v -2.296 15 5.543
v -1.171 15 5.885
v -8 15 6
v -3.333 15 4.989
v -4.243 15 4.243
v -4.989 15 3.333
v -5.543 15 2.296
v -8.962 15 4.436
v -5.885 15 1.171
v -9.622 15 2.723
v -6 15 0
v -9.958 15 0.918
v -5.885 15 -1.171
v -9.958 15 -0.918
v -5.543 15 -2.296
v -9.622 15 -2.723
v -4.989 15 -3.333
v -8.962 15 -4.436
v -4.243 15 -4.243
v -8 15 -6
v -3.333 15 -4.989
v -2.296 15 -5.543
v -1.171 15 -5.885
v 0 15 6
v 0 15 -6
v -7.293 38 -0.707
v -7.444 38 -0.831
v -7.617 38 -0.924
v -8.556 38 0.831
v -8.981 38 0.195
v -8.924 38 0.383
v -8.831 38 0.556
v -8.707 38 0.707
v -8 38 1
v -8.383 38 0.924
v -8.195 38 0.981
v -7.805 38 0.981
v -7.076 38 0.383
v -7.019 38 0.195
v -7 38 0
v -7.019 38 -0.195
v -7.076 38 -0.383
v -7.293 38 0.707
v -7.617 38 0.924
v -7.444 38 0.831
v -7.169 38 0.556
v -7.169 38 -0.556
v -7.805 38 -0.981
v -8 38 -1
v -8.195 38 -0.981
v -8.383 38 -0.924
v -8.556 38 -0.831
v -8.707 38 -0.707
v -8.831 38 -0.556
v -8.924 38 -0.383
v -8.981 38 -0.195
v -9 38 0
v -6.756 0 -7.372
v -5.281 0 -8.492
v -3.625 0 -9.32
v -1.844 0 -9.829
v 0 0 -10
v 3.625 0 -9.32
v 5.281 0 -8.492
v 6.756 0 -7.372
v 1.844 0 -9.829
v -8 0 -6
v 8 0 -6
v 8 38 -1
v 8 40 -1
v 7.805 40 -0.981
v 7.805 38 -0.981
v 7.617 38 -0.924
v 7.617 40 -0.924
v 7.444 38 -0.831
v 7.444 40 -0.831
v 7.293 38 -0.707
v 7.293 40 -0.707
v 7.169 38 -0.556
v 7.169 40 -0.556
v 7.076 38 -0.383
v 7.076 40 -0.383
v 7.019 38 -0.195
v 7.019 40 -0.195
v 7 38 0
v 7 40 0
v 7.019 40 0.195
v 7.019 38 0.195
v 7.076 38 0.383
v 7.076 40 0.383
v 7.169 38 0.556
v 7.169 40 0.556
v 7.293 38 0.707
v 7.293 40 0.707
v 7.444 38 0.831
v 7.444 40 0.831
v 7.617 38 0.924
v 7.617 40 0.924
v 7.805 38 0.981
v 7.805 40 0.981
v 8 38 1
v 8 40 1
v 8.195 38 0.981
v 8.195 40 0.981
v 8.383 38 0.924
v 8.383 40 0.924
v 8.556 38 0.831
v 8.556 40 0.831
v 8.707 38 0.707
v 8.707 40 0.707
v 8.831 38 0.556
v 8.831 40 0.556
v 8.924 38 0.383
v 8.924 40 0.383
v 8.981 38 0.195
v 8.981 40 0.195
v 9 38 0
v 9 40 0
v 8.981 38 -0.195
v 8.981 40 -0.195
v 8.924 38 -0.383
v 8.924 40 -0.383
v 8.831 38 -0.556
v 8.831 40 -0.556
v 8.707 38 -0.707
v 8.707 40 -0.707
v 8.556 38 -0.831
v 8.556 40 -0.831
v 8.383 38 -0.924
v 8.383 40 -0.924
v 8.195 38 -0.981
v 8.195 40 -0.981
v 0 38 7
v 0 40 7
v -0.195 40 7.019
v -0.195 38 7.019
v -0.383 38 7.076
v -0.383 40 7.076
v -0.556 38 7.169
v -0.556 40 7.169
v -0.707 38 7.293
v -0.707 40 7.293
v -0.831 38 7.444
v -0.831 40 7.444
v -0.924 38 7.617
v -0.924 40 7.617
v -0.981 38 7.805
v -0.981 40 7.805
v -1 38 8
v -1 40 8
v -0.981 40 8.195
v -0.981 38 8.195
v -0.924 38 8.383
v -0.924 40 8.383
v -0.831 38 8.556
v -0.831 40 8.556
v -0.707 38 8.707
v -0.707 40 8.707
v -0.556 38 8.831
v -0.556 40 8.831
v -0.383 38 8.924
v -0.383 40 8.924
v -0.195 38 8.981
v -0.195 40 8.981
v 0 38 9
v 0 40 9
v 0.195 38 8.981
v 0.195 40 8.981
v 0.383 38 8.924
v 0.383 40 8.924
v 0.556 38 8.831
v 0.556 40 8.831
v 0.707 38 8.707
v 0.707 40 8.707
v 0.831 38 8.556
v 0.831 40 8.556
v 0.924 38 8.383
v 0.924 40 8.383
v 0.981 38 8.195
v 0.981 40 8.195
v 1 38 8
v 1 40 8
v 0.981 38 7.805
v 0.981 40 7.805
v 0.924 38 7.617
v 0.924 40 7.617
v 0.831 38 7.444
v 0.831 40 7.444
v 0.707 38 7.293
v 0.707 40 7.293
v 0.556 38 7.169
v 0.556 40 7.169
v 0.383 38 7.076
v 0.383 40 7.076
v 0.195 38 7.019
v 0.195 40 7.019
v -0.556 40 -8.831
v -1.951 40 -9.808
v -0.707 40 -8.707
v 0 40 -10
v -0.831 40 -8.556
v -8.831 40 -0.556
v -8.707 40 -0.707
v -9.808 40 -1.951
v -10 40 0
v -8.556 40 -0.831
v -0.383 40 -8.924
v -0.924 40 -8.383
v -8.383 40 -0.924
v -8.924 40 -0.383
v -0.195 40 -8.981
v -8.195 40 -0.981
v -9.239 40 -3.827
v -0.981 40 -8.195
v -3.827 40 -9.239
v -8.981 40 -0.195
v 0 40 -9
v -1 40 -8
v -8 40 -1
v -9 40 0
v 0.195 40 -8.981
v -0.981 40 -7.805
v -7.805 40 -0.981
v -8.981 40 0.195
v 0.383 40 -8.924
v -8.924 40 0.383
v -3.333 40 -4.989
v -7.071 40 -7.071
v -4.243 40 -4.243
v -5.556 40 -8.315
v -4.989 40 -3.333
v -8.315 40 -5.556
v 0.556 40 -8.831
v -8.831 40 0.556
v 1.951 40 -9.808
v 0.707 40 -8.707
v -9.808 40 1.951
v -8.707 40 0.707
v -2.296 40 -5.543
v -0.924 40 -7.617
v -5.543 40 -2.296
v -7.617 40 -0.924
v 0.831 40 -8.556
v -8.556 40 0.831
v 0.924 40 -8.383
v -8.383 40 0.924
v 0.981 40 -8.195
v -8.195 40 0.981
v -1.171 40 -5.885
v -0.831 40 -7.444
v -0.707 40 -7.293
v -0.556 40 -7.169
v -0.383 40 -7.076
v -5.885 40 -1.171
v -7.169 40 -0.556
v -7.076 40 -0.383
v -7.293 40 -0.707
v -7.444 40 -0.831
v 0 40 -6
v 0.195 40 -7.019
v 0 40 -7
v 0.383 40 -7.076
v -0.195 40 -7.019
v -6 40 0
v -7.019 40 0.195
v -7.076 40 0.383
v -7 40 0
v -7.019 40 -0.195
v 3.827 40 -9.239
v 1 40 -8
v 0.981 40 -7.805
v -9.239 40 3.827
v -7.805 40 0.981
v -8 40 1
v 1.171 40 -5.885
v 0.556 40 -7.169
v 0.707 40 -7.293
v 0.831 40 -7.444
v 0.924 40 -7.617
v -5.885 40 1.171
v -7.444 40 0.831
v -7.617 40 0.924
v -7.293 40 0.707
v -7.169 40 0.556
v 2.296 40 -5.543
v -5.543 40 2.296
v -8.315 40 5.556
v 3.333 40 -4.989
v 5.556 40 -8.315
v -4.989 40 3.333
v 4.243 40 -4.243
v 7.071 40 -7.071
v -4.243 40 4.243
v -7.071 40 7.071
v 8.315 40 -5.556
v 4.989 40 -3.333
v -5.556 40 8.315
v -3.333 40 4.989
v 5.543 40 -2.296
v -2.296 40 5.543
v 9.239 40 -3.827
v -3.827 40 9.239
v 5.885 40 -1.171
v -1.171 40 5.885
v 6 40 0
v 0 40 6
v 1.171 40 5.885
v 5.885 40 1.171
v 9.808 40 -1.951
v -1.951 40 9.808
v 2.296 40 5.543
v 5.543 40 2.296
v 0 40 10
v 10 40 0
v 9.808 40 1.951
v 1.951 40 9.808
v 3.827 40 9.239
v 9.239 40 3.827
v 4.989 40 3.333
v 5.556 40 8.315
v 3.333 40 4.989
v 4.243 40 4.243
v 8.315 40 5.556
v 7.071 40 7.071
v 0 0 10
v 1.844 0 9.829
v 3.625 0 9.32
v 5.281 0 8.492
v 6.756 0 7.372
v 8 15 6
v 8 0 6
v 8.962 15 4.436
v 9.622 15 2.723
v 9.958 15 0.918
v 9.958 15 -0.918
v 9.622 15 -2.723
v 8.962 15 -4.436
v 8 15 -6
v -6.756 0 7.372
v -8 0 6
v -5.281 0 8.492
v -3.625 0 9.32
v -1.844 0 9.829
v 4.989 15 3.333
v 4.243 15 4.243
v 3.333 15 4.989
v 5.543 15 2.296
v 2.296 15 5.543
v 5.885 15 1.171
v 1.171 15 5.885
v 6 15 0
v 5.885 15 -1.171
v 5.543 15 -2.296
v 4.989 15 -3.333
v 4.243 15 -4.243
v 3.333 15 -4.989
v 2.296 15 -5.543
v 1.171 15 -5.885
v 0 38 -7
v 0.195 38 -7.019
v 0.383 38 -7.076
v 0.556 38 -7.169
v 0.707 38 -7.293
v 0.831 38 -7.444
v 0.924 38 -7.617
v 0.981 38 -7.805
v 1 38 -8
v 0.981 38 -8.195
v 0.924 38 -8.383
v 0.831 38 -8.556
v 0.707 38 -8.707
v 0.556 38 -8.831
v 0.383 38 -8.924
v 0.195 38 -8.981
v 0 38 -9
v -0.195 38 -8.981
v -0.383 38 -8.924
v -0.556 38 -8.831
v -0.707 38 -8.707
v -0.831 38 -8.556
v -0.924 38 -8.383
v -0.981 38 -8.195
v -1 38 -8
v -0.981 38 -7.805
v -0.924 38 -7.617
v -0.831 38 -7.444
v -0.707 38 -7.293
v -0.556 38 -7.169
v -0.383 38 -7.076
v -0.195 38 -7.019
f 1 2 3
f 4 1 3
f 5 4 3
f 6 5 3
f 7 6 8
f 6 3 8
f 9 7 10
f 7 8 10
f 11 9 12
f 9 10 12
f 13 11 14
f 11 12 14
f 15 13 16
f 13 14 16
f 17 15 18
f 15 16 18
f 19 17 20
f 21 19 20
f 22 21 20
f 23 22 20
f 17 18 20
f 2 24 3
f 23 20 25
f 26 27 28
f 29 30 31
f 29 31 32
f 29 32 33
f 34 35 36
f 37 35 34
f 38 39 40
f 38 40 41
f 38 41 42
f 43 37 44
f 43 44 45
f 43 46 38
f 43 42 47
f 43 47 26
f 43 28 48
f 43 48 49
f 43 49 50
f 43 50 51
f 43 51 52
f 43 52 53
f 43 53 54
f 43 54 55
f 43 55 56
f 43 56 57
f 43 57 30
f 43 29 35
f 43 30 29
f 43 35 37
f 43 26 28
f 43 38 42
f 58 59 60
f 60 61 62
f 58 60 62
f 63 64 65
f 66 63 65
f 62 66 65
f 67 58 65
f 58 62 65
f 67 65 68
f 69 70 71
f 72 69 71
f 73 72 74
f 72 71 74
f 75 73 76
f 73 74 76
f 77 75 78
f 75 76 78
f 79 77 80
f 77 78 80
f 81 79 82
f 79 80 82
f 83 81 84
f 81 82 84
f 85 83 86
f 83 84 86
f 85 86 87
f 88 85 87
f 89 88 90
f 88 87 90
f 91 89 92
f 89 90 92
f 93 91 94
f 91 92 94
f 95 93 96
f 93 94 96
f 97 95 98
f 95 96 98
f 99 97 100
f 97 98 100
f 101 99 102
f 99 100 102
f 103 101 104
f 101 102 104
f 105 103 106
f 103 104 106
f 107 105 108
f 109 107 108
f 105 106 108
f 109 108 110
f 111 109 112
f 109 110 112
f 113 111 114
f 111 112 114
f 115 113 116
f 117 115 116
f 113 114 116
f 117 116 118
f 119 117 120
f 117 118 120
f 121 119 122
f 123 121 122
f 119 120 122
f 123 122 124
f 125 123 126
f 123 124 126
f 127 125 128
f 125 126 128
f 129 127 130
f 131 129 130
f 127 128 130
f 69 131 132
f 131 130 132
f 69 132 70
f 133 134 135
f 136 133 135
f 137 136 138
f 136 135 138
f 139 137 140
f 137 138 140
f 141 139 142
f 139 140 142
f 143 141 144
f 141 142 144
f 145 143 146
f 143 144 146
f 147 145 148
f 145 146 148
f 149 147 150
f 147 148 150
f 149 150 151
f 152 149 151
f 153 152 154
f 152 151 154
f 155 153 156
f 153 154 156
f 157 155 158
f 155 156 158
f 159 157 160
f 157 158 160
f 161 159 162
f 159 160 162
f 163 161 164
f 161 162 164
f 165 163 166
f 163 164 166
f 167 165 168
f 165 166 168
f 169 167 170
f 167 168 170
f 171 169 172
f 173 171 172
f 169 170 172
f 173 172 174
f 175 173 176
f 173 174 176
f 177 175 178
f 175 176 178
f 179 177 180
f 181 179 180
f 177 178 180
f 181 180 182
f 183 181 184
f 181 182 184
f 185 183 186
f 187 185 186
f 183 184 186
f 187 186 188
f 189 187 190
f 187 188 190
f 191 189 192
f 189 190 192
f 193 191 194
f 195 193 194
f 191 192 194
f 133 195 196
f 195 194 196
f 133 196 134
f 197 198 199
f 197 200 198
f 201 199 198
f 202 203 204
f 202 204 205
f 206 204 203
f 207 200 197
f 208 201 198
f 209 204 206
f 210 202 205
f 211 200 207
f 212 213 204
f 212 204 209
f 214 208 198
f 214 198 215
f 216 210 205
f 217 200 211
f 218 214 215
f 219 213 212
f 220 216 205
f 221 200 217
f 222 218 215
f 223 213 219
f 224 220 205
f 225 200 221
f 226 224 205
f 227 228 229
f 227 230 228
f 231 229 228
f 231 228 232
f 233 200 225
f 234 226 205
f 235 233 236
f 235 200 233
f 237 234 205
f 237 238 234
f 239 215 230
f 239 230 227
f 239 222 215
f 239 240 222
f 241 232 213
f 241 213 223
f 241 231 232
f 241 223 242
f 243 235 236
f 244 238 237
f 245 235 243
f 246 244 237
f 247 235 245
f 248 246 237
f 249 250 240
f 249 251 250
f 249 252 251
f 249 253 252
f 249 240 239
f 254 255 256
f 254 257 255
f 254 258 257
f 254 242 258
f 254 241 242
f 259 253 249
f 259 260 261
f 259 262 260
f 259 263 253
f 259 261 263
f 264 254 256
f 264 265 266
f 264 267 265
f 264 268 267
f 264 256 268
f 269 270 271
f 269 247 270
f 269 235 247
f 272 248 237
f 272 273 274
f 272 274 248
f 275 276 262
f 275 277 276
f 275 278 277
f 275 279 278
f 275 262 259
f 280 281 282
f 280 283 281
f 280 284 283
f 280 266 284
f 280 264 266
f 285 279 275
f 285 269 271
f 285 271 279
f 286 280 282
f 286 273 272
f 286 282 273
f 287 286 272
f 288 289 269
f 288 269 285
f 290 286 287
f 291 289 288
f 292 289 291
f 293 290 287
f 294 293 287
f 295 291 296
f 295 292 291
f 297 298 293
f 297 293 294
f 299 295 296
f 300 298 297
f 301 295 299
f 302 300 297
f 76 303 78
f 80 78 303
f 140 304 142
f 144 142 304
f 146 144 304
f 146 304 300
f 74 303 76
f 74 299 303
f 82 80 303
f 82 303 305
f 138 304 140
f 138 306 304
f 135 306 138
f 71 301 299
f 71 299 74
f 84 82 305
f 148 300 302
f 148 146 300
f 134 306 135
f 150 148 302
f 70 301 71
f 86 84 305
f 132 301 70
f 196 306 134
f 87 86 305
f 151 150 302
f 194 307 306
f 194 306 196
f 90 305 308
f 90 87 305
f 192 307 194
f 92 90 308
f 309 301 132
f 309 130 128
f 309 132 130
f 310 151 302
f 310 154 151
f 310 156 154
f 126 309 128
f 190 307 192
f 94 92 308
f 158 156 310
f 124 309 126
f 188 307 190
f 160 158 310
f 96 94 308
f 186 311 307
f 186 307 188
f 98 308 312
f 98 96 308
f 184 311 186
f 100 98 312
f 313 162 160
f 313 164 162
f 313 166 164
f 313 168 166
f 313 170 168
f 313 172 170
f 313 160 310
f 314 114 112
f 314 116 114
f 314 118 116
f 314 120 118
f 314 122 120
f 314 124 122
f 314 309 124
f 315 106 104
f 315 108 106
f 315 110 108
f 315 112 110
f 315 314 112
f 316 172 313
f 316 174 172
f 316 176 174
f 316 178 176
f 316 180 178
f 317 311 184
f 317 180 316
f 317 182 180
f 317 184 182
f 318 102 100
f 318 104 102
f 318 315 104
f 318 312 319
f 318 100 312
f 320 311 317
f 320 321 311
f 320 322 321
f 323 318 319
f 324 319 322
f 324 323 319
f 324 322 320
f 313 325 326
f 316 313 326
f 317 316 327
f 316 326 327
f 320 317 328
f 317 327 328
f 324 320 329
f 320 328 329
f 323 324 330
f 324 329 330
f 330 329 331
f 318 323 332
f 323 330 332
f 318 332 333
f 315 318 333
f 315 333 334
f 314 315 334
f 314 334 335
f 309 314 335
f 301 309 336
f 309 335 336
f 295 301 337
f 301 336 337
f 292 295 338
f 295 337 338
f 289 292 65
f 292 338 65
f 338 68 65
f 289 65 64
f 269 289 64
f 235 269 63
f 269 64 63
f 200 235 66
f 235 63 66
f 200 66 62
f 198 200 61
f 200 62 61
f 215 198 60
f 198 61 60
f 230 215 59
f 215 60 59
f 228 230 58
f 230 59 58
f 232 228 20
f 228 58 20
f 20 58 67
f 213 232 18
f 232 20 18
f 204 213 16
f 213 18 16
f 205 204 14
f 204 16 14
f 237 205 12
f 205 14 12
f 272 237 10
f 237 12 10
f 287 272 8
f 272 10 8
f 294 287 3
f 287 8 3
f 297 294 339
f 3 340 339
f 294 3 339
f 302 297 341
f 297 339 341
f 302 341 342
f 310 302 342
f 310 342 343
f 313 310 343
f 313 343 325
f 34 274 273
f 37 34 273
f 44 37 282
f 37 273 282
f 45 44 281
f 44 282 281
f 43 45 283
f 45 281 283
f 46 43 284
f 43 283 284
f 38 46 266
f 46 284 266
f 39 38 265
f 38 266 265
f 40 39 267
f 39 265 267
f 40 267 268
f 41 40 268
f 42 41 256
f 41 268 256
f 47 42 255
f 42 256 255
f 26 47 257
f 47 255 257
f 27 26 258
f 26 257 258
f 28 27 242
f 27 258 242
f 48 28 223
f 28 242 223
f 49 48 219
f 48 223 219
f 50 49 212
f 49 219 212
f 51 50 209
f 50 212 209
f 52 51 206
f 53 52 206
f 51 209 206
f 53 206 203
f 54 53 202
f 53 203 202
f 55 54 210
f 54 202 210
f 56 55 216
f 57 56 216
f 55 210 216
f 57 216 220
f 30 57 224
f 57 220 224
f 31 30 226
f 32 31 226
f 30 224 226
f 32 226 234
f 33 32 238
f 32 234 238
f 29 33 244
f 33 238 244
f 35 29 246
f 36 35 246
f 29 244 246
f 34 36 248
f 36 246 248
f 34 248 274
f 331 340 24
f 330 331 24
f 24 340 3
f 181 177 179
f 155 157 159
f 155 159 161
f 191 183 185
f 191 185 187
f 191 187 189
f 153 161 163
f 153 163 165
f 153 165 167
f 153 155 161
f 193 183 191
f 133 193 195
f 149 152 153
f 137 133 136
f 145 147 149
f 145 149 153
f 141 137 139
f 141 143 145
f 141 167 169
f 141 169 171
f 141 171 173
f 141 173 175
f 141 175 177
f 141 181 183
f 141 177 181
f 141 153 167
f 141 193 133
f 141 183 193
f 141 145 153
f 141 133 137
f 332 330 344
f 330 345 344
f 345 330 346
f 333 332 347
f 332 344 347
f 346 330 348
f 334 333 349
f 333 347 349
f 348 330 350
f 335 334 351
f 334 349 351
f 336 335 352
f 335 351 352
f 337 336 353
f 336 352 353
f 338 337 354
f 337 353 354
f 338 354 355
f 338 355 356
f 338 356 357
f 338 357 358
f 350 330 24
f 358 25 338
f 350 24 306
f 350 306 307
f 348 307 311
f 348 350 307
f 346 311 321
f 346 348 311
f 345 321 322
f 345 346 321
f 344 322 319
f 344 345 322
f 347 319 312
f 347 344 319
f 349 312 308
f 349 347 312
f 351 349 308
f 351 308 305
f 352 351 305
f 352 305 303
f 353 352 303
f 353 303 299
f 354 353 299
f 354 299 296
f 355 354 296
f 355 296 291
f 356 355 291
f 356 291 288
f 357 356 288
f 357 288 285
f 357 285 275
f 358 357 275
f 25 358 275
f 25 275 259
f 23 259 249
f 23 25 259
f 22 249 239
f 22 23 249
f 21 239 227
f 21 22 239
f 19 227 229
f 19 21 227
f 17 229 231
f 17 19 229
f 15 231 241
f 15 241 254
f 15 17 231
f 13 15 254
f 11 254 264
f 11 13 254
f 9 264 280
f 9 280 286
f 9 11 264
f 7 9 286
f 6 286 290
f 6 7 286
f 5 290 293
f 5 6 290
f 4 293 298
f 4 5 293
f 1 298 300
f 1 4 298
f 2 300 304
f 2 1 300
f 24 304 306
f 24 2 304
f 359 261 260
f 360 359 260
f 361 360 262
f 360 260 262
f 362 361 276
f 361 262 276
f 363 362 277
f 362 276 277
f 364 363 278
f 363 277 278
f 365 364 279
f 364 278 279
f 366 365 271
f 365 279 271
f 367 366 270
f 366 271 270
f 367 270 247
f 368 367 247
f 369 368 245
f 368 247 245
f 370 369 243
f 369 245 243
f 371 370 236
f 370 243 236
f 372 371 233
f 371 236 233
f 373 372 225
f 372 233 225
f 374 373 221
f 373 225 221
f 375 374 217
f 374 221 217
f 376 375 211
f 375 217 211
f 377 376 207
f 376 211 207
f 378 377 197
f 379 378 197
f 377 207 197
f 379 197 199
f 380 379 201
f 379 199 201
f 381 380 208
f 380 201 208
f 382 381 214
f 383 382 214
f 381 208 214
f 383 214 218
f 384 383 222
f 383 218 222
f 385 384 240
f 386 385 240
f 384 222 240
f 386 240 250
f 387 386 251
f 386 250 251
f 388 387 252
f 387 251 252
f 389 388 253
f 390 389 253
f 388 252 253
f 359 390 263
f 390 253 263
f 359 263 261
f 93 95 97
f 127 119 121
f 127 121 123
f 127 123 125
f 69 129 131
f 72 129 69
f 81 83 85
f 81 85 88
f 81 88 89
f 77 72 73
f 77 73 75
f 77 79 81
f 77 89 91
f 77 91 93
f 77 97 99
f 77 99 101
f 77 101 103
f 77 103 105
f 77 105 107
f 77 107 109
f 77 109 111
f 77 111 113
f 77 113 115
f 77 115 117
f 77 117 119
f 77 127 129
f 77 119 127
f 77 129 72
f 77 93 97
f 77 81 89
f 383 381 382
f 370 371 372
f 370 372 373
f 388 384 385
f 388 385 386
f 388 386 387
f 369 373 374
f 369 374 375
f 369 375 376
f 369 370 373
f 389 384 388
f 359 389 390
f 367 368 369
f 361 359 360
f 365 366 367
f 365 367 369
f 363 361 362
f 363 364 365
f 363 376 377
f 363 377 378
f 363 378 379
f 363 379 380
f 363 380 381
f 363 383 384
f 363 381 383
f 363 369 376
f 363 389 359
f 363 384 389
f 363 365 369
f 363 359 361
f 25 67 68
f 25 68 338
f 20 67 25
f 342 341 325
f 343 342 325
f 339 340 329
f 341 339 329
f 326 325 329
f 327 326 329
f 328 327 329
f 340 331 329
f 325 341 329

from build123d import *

# Parameters (mm, degrees)
SKETCH_1_R               = 10
SKETCH_1_R_2             = 6
EXTRUDE_1_DEPTH          = 40
SKETCH_2_R               = 1
CUT_EXTRUDE_1_DEPTH      = 2
CUT_EXTRUDE_2_DEPTH      = 43.426406871
CUT_EXTRUDE_2_DEPTH_BACK = 43.426406871
SKETCH_3_W               = 12
SKETCH_3_H               = 15


with BuildPart() as part:
    # 草图1 → 凸台-拉伸1 (new body)
    with BuildSketch(Plane(origin=(0, 0, 0), x_dir=(1, 0, 0), z_dir=(0, 1, 0))):
        with Locations(Location((0, 0, 0), (0, 0, 270))):
            Circle(SKETCH_1_R)
        with Locations(Location((0, 0, 0), (0, 0, 270))):
            Circle(SKETCH_1_R_2, mode=Mode.SUBTRACT)
    extrude(amount=EXTRUDE_1_DEPTH)

    # 草图2 → 切除-拉伸1 (cut)
    with BuildSketch(Plane(origin=(0, 40, 0), x_dir=(1, 0, 0), z_dir=(0, 1, 0))):
        with Locations(Location((-8, 0, 0), (0, 0, 270))):
            Circle(SKETCH_2_R)
        with Locations(Location((8, 0, 0), (0, 0, 90))):
            Circle(SKETCH_2_R)
        with Locations(Location((0, 8, 0), (0, 0, 270))):
            Circle(SKETCH_2_R)
        with Locations(Location((0, -8, 0), (0, 0, 90))):
            Circle(SKETCH_2_R)
    extrude(amount=-CUT_EXTRUDE_1_DEPTH, mode=Mode.SUBTRACT)

    # 草图3 → 切除-拉伸2 (cut, two sides: drawn at the far end of the back side and taken through both)
    with BuildSketch(Plane(origin=(0, 0, 0), x_dir=(0, 0, -1), z_dir=(1, 0, 0)).offset(-CUT_EXTRUDE_2_DEPTH_BACK)):
        with Locations((0, 7.5)):
            Rectangle(SKETCH_3_W, SKETCH_3_H)
    extrude(amount=CUT_EXTRUDE_2_DEPTH + CUT_EXTRUDE_2_DEPTH_BACK, mode=Mode.SUBTRACT)


solid = part.part
